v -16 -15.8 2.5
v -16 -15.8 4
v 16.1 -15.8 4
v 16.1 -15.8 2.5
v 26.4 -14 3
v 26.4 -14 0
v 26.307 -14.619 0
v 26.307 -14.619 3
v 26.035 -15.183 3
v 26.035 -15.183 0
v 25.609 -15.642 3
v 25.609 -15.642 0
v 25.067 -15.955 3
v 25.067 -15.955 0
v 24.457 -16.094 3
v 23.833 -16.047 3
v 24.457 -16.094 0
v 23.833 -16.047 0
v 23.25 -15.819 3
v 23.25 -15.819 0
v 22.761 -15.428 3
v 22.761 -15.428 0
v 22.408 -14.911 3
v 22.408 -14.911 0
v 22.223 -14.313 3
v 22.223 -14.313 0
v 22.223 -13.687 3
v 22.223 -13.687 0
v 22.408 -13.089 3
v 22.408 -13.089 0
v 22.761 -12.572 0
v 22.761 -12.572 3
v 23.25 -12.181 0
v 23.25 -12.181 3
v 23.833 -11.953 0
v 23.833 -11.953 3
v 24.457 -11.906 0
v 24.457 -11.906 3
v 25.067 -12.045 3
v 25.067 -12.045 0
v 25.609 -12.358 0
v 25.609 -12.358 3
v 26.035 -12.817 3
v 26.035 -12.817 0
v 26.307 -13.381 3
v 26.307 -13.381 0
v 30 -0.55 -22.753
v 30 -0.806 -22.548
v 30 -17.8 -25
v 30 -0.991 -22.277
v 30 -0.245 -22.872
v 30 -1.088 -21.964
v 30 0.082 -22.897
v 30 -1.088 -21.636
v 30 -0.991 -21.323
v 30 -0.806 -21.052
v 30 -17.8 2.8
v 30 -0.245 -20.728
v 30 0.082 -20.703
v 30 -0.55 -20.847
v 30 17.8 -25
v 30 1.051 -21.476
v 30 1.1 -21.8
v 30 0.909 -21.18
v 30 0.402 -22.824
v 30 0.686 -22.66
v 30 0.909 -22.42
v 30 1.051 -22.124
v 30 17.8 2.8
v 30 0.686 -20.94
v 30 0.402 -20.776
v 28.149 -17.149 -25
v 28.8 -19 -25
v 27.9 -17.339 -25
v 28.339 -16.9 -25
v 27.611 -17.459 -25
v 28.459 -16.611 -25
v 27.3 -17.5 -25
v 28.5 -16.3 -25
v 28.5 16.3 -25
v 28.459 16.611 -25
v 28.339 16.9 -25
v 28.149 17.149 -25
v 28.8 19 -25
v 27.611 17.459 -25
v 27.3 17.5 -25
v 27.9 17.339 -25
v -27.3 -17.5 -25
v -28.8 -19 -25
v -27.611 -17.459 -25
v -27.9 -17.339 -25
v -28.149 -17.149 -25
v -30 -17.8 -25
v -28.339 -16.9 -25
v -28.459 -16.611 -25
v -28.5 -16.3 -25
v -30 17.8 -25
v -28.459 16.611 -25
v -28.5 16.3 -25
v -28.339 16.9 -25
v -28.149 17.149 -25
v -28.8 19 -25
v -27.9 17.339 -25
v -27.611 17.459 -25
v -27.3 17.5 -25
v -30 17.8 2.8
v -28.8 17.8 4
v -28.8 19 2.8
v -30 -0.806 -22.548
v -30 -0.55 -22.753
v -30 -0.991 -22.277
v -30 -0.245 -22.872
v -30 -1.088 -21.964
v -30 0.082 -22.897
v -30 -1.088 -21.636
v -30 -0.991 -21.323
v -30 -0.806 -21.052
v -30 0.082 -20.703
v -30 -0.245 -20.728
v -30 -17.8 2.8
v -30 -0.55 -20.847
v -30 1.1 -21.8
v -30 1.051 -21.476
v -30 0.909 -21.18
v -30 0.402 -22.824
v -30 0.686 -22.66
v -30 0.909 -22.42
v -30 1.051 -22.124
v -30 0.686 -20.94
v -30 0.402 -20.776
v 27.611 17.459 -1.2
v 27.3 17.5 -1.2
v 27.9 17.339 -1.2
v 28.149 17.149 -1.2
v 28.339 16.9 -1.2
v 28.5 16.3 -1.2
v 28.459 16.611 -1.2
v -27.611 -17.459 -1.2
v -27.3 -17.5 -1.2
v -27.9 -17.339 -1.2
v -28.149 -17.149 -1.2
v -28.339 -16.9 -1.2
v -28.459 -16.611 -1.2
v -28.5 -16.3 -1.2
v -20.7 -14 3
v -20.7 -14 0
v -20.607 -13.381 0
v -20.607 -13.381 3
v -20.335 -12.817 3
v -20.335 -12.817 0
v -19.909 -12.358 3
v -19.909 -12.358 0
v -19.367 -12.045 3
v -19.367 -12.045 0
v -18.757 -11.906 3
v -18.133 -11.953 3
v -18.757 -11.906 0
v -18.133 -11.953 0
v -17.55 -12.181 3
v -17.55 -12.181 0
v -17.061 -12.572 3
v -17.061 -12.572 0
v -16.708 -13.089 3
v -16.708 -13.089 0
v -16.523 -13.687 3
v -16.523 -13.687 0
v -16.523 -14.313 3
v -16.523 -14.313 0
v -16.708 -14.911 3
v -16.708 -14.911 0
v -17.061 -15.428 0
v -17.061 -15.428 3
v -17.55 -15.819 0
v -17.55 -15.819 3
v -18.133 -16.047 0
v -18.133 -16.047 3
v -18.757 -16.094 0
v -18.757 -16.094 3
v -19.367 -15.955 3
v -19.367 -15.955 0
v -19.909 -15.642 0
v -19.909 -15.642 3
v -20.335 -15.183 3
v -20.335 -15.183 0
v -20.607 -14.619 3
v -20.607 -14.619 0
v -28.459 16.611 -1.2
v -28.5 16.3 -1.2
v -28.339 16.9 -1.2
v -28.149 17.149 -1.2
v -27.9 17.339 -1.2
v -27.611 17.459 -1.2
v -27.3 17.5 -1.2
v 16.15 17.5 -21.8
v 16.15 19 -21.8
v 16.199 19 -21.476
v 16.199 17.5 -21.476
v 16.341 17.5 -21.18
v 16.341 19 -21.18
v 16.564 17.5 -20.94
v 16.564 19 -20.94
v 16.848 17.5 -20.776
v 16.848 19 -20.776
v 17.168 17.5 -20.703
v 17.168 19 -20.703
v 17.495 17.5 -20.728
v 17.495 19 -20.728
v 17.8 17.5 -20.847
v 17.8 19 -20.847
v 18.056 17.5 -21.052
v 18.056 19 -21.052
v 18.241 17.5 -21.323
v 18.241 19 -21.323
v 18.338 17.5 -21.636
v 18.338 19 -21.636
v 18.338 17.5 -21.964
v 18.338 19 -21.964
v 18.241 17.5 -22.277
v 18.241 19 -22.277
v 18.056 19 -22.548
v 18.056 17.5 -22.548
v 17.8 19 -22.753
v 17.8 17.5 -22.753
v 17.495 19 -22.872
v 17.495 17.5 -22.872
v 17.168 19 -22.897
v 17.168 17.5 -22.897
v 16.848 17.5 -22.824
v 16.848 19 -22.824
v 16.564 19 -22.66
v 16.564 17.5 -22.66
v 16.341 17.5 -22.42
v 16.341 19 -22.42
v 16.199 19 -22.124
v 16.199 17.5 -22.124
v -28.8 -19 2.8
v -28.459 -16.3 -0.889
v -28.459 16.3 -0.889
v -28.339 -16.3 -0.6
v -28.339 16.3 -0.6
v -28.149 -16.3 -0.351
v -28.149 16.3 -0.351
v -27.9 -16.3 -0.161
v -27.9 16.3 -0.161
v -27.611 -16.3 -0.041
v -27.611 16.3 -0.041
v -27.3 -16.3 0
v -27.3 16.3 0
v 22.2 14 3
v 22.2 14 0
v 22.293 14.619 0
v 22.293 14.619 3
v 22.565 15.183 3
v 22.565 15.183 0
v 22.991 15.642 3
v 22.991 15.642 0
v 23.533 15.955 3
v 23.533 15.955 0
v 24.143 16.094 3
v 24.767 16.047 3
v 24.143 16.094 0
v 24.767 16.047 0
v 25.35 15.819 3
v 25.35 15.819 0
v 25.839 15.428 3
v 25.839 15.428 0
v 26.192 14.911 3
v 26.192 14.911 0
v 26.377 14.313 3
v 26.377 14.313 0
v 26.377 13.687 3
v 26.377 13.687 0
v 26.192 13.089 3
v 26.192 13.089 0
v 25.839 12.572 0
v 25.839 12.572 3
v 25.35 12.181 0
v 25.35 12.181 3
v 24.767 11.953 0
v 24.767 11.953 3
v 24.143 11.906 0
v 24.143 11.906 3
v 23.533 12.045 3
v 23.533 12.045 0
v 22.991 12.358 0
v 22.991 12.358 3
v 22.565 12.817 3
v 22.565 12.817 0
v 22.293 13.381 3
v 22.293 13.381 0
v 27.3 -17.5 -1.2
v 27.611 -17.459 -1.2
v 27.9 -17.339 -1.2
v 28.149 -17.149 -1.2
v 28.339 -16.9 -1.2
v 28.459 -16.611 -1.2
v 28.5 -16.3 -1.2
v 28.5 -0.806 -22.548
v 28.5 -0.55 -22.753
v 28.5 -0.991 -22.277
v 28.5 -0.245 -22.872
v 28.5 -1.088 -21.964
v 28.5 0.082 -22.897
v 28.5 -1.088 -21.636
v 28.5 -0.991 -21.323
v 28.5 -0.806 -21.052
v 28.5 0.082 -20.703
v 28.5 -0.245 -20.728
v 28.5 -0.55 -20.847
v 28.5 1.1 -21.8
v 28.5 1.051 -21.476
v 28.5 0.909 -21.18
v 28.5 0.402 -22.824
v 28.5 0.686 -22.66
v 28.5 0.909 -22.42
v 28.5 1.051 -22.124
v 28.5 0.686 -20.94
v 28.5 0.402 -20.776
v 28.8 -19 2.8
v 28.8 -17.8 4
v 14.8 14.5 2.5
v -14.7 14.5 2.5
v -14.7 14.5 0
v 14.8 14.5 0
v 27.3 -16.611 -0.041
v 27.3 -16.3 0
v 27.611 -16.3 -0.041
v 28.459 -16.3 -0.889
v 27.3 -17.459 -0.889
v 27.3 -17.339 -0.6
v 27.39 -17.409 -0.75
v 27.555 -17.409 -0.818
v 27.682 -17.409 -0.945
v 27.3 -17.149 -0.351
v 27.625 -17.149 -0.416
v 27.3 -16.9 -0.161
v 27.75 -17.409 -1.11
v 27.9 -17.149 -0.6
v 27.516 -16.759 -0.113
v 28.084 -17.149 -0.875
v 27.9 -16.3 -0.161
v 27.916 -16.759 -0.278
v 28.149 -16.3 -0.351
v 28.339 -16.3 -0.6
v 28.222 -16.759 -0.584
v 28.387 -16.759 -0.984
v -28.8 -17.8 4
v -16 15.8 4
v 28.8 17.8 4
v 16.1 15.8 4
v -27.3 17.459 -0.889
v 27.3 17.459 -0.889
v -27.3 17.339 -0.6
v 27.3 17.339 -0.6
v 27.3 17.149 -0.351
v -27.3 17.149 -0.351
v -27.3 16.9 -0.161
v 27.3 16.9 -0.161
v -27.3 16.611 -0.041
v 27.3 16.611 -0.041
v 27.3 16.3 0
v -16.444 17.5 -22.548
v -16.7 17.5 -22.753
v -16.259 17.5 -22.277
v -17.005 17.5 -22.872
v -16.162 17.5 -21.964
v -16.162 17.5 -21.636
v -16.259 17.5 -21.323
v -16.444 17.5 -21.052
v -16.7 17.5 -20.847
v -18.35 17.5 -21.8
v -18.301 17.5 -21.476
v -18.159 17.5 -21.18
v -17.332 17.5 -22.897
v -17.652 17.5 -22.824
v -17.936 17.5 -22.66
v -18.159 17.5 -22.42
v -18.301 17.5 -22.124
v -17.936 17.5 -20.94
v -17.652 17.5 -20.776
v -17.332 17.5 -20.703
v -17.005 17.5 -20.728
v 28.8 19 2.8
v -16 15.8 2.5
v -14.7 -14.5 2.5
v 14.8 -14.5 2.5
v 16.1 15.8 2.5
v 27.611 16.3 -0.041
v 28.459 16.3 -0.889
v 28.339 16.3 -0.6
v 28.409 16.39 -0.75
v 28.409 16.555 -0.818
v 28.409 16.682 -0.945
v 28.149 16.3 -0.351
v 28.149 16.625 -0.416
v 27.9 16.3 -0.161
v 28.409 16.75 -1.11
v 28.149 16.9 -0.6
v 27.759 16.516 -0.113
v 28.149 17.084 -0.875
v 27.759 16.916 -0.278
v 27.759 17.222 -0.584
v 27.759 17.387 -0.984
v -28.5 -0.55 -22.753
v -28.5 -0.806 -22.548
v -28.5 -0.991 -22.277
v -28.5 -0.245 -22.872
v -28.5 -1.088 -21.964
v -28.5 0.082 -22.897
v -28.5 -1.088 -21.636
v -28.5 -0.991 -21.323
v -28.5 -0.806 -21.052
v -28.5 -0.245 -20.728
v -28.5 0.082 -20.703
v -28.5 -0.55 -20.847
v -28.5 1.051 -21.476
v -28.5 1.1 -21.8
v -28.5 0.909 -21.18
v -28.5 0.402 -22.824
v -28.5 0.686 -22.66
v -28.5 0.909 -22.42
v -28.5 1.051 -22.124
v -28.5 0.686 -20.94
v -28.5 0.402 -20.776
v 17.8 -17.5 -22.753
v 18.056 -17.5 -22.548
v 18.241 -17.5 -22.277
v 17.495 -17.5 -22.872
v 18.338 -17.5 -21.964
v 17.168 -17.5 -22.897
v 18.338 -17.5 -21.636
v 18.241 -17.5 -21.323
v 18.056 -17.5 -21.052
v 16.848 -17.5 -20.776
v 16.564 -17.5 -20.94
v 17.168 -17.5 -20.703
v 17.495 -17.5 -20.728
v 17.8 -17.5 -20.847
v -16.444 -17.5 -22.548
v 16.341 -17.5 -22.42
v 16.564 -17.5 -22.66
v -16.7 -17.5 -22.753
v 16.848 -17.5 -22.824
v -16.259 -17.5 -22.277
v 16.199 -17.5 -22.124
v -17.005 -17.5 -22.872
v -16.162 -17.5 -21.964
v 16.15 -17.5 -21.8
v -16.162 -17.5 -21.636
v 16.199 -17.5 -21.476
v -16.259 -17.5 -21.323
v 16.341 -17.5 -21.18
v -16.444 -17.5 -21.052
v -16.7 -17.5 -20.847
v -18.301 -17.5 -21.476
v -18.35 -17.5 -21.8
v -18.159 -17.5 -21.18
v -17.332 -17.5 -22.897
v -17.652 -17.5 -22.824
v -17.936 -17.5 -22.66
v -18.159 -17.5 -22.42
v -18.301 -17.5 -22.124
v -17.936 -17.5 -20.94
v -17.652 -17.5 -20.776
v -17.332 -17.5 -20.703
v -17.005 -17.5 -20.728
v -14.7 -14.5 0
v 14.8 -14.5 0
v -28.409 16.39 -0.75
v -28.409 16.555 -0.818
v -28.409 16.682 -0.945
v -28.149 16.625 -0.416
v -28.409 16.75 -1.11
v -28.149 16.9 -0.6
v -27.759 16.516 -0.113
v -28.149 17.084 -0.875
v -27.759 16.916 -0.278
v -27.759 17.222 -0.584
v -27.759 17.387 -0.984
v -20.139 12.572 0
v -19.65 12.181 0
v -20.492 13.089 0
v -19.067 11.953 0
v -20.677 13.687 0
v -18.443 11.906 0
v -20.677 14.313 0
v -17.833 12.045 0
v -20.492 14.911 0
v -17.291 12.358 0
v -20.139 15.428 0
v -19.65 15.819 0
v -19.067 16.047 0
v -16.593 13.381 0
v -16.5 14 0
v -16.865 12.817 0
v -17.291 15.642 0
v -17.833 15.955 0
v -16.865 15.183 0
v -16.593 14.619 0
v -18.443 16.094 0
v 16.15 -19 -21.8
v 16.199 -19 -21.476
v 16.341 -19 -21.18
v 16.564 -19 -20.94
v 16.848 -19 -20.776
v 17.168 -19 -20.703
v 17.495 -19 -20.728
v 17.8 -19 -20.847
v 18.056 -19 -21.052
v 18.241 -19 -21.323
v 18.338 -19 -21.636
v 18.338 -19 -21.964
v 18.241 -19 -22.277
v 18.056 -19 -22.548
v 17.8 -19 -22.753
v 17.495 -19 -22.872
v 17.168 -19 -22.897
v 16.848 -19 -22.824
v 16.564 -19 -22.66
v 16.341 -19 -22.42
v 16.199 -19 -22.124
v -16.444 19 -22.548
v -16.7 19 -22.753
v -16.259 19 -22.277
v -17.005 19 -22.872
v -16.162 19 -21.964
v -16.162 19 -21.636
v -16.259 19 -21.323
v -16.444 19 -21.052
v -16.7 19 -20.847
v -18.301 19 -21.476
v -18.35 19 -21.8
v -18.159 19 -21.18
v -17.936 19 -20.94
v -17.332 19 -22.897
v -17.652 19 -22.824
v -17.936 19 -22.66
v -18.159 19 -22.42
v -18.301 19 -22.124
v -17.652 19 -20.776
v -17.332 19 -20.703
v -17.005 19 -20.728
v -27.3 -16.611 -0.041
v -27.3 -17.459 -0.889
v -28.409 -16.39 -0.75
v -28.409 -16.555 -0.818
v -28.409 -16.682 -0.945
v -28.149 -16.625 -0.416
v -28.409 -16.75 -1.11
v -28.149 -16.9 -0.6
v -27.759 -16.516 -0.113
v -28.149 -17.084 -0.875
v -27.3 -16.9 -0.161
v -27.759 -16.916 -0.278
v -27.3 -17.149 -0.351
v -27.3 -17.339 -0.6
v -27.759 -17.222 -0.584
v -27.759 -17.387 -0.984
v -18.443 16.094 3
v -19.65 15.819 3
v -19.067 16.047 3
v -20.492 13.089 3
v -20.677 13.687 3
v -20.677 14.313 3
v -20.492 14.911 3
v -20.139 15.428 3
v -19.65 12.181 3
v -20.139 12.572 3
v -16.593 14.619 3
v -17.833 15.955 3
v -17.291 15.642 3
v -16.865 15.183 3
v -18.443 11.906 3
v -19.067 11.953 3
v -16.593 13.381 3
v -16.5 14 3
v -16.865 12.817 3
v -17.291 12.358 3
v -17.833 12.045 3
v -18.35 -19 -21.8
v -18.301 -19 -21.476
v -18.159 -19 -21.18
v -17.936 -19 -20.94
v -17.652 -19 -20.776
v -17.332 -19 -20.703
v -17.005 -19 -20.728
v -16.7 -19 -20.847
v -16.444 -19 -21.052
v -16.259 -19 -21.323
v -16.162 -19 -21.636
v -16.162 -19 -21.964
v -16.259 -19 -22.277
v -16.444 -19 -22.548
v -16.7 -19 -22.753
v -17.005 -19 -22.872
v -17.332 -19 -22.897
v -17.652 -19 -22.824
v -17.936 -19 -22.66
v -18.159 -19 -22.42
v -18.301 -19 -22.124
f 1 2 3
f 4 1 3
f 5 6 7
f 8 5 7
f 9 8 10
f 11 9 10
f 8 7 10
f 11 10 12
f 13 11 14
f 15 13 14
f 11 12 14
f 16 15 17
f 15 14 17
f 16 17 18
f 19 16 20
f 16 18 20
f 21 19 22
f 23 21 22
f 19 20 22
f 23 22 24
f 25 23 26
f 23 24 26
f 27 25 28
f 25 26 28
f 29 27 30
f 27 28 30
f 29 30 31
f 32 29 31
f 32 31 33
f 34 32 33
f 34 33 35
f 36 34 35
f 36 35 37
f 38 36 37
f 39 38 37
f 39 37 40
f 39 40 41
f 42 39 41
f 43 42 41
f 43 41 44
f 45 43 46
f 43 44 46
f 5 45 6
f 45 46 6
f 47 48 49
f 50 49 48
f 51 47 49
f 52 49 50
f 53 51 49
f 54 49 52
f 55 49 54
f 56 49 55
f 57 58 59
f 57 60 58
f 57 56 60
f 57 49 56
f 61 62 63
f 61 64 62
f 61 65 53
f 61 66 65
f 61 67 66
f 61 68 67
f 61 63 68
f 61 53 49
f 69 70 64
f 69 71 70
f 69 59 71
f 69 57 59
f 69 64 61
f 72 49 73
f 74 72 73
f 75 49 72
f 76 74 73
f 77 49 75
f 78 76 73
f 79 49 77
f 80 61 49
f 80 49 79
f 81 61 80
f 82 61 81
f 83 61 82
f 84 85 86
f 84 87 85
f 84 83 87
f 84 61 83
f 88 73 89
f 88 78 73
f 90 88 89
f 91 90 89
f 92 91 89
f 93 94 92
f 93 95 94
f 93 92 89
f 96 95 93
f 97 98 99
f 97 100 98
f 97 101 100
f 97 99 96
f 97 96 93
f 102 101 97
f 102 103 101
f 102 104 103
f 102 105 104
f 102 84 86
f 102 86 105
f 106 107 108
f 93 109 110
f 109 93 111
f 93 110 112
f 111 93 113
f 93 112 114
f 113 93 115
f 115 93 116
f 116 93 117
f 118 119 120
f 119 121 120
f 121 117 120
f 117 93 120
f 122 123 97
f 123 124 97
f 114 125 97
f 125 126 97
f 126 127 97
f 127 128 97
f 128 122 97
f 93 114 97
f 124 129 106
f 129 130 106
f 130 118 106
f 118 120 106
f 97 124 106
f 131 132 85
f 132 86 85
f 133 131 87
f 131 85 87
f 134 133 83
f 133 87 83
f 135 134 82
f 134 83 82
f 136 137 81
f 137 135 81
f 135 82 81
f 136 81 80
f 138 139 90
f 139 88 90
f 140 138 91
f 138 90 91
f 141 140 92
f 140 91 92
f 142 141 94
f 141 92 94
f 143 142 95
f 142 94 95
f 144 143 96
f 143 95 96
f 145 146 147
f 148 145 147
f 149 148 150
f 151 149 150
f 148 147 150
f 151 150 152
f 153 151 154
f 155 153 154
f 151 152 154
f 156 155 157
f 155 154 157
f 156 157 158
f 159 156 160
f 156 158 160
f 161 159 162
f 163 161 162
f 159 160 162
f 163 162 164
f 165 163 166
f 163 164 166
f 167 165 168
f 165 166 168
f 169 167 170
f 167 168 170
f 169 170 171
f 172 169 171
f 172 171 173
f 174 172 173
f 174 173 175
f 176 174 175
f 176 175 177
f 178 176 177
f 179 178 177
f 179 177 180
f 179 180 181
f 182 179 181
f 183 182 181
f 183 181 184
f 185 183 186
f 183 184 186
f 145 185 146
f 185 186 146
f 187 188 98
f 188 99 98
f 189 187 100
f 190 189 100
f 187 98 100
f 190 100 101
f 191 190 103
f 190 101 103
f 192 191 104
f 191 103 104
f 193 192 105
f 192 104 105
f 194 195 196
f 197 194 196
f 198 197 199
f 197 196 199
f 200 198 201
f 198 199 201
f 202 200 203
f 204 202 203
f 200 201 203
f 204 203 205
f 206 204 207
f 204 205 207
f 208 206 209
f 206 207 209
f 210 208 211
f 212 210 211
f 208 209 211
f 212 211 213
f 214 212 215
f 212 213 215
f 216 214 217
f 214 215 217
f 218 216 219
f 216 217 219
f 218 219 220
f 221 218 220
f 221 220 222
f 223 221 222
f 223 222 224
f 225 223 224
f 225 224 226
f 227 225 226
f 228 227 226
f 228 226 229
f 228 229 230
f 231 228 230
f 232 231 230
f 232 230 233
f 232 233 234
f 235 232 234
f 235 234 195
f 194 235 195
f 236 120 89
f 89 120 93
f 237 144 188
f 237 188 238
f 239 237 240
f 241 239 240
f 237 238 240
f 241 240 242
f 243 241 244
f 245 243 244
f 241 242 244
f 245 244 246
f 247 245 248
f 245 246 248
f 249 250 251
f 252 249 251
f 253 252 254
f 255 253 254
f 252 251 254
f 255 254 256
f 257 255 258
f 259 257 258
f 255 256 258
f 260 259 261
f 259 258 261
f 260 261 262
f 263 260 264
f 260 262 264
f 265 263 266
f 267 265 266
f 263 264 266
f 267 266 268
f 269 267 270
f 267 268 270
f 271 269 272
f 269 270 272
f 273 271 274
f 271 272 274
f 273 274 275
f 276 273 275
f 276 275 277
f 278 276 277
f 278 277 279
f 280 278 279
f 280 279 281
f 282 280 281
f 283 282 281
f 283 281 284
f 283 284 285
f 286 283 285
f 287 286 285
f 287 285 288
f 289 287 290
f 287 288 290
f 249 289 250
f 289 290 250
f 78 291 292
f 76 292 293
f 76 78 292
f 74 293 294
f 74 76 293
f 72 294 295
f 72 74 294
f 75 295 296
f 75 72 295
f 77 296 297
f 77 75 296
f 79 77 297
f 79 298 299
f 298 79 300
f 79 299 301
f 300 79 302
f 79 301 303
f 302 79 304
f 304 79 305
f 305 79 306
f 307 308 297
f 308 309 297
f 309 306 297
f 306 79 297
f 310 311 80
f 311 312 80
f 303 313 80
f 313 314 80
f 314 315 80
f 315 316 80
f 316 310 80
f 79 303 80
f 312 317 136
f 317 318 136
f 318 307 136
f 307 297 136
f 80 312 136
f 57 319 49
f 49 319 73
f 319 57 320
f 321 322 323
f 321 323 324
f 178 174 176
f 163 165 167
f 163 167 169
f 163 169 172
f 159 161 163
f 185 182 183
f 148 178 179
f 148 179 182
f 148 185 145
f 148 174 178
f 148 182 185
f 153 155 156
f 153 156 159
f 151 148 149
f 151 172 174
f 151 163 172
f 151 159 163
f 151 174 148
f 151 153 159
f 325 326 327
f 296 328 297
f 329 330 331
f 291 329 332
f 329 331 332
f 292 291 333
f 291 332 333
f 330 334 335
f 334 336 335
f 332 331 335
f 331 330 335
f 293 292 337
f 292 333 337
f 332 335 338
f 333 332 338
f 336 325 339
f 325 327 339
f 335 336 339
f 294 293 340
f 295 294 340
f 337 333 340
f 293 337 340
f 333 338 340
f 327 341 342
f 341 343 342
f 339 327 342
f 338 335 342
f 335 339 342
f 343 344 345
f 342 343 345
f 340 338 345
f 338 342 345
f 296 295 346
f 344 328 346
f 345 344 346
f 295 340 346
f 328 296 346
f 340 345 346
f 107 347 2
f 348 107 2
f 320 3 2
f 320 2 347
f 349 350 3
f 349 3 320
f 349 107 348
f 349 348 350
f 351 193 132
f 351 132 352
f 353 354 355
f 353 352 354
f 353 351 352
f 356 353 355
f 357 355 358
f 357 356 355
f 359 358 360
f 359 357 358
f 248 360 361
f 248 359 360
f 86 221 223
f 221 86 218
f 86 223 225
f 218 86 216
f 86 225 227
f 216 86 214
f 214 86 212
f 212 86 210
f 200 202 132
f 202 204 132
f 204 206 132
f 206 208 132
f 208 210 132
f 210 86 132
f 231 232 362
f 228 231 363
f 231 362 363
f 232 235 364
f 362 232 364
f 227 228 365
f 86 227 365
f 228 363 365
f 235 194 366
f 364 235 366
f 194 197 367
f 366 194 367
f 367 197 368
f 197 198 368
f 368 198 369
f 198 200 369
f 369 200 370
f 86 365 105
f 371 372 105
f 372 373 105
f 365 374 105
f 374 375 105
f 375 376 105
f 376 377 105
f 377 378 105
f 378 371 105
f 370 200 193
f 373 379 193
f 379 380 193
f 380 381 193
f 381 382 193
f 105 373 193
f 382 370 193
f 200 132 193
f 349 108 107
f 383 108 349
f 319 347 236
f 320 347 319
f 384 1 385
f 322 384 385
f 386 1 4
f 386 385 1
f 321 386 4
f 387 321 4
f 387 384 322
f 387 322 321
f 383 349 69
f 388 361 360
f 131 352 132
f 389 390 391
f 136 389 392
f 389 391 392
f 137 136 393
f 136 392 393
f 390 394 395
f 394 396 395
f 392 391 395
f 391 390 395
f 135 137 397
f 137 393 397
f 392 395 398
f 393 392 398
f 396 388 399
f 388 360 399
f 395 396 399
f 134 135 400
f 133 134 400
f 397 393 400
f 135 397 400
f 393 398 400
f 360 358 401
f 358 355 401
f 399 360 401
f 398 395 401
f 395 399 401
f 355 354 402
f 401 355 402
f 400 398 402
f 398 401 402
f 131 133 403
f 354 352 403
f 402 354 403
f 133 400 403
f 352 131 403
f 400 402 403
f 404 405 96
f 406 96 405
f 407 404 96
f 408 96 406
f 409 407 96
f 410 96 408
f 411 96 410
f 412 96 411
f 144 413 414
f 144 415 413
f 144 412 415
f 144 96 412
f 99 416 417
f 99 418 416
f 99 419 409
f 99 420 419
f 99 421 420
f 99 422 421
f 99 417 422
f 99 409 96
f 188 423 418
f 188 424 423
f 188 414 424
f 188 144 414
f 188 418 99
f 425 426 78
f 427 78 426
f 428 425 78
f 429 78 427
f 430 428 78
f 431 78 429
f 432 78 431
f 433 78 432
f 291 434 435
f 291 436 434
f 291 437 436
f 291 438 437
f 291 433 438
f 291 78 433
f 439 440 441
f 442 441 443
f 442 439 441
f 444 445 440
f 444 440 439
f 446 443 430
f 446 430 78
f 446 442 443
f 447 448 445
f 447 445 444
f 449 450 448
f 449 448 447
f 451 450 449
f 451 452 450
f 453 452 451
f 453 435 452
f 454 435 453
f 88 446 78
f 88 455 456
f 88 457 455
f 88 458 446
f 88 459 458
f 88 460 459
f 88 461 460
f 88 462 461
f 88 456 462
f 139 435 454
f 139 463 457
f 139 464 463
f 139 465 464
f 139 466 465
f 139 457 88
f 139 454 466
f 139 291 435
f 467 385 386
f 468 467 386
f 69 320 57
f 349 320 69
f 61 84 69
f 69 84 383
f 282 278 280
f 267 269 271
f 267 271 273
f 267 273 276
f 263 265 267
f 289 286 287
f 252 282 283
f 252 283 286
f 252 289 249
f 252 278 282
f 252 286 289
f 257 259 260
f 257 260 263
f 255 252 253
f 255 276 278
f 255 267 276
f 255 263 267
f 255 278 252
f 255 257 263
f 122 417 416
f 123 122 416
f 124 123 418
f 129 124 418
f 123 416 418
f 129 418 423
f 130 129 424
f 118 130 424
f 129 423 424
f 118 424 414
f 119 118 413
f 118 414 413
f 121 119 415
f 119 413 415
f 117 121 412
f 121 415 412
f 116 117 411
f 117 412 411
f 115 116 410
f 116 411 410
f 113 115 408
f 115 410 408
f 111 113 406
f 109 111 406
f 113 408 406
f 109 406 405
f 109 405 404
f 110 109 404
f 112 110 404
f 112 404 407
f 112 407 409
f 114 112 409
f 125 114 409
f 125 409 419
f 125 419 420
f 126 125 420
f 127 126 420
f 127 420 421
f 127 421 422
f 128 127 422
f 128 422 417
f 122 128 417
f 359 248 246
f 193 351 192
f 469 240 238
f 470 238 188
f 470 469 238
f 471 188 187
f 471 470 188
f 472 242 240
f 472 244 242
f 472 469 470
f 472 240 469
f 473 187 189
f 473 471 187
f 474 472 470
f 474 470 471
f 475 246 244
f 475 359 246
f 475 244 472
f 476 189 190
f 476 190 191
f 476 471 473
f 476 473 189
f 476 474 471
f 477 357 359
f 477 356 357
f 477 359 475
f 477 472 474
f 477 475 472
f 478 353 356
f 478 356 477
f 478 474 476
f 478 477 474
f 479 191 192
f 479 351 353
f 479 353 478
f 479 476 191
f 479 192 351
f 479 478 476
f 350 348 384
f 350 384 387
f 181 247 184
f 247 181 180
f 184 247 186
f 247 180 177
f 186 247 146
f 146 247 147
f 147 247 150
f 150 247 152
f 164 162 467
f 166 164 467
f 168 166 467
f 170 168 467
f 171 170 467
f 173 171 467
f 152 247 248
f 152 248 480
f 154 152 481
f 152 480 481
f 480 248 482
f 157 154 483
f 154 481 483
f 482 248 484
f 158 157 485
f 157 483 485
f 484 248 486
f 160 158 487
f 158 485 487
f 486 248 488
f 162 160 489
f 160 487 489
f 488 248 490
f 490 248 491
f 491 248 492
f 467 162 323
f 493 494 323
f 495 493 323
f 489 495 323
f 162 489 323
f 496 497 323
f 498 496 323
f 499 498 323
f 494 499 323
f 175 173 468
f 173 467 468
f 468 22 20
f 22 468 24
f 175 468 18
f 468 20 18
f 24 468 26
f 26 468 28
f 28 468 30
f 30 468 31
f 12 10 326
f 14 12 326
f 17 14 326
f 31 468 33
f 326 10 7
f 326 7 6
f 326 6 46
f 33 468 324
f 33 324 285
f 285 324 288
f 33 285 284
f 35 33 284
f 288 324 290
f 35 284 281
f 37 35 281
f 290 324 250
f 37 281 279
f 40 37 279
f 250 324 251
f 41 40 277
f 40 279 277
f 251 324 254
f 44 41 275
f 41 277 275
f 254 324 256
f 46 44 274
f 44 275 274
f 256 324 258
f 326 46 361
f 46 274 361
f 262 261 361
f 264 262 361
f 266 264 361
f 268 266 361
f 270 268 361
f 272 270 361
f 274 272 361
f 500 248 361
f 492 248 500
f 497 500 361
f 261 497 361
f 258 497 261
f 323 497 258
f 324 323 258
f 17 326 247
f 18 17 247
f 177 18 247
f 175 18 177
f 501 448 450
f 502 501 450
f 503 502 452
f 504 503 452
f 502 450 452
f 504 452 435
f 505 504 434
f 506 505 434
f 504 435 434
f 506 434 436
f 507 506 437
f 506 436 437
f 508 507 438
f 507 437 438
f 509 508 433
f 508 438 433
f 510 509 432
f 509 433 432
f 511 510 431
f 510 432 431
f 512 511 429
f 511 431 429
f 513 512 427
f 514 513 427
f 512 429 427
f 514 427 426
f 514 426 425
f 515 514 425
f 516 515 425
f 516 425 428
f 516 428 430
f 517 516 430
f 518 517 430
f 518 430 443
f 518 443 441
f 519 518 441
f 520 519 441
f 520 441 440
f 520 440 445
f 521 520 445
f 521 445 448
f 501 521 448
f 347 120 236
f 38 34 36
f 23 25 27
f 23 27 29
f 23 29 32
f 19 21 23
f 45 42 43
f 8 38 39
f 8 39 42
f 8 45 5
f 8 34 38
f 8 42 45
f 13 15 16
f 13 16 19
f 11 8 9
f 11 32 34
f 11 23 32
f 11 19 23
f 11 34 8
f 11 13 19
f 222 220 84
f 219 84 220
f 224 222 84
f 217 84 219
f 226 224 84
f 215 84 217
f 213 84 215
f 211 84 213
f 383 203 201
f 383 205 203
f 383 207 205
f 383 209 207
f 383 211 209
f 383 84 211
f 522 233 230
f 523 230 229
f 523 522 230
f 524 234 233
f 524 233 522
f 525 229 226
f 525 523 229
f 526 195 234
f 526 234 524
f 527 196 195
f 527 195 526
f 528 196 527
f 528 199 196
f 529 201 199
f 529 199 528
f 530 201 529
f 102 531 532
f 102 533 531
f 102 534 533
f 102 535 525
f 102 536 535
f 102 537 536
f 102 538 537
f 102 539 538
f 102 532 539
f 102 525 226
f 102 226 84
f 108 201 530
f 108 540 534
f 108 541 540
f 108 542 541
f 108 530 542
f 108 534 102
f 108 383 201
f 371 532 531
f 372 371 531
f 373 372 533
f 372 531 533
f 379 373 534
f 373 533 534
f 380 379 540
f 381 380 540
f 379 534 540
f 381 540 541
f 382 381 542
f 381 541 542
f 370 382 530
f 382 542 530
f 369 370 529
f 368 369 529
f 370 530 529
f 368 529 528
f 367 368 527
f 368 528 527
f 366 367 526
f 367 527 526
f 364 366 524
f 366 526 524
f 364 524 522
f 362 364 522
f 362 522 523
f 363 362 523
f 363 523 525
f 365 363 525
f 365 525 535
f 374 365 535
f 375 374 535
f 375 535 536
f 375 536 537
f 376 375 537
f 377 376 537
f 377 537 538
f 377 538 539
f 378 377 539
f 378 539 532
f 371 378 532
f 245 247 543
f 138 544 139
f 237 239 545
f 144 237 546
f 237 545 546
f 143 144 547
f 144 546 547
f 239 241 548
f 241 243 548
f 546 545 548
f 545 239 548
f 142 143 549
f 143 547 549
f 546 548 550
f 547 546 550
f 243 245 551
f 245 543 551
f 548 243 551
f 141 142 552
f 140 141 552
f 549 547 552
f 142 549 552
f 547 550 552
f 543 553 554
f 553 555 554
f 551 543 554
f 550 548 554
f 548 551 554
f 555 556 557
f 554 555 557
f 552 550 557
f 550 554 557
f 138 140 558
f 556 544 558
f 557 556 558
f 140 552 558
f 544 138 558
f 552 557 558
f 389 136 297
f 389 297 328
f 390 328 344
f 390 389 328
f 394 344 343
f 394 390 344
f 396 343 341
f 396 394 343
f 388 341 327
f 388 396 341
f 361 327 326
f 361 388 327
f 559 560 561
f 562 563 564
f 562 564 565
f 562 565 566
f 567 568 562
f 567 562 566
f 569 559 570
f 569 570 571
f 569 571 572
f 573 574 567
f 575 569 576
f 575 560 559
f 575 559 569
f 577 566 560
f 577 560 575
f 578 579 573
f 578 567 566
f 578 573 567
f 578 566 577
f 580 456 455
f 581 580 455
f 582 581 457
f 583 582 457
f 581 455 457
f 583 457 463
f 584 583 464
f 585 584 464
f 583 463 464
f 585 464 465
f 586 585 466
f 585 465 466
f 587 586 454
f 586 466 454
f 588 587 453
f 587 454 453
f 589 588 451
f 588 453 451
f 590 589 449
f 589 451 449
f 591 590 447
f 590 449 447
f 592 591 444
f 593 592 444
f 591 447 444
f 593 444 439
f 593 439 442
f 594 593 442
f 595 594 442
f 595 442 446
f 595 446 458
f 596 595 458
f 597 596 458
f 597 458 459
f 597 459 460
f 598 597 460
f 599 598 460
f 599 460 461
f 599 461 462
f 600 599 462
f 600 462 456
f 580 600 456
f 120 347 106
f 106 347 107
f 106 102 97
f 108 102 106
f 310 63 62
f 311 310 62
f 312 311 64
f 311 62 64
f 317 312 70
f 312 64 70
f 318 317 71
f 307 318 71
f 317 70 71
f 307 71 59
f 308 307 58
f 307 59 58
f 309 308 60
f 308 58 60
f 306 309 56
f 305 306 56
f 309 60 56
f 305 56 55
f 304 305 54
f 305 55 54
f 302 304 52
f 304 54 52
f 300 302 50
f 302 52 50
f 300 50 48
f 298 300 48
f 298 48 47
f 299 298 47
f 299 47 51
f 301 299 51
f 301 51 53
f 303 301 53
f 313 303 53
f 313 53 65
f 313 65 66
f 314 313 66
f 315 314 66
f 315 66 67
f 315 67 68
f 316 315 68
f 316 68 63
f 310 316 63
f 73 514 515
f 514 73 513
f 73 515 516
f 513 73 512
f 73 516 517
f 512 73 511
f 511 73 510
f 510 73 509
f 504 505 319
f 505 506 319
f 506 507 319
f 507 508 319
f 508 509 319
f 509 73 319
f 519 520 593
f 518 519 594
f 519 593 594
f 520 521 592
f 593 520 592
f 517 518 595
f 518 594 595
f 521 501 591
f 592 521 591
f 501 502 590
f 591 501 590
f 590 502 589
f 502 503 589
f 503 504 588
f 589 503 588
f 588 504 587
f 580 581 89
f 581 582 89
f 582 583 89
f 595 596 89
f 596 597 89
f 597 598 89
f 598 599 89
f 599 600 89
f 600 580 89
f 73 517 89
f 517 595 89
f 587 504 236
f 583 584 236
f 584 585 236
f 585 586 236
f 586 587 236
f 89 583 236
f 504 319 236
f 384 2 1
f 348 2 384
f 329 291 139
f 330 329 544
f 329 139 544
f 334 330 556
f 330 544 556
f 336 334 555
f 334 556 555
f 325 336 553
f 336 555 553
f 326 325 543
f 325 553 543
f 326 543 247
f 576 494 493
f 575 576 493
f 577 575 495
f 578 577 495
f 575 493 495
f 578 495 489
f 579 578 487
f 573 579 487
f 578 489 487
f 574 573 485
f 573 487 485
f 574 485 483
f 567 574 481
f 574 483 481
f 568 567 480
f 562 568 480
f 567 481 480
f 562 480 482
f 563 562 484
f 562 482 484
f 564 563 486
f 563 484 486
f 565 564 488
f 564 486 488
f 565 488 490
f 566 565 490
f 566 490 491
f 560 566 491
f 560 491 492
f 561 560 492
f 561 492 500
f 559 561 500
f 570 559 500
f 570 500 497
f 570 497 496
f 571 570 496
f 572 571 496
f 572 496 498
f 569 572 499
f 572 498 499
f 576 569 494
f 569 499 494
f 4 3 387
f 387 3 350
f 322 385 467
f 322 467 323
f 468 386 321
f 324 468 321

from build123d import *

# Parameters (mm, degrees)
ESQUISSE1_W                     = 60
ESQUISSE1_H                     = 38
BASE_DEPTH                      = 4
ESQUISSE2_W                     = 29.5
ESQUISSE2_H                     = 29
SCREEN_DEPTH                    = 4
ESQUISSE5_R                     = 2.1
INSERTS_M3_DEPTH                = 3
ESQUISSE6_W                     = 60
ESQUISSE6_H                     = 38
ESQUISSE6_W_2                   = 57
ESQUISSE6_H_2                   = 35
WALLS_DEPTH                     = 25
CHANFREIN_EXT_SIZE              = 1.2
FILLET_INT_R                    = 1.2
ESQUISSE7_R                     = 1.1
PASSAGE_VIS_HORIZONTAL_DEPTH    = 68.720011813
ESQUISSE9_R                     = 1.1
PASSAGE_VIS_VERTICAL_DEPTH      = 55.488530903
ESQUISSE11_W                    = 32.1
ESQUISSE11_H                    = 31.6
EMPLACEMENT_VERRE_32_5_32_DEPTH = 1.5


with BuildPart() as part:
    # Esquisse1 → BASE (new body)
    with BuildSketch(Plane.XY):
        Rectangle(ESQUISSE1_W, ESQUISSE1_H)
    extrude(amount=BASE_DEPTH)

    # Esquisse2 → Screen (cut)
    with BuildSketch(Plane.XY.offset(4)):
        with Locations((0.05, 0)):
            Rectangle(ESQUISSE2_W, ESQUISSE2_H)
    extrude(amount=-SCREEN_DEPTH, mode=Mode.SUBTRACT)

    # Esquisse5 → Inserts_M3 (cut)
    with BuildSketch(Plane(origin=(0, 0, 0), x_dir=(-1, 0, 0), z_dir=(0, 0, -1))):
        with Locations((-24.3, 14)):
            Circle(ESQUISSE5_R)
        with Locations(Location((-24.3, -14, 0), (0, 0, 180))):
            Circle(ESQUISSE5_R)
        with Locations((18.6, -14)):
            Circle(ESQUISSE5_R)
        with Locations(Location((18.6, 14, 0), (0, 0, 180))):
            Circle(ESQUISSE5_R)
    extrude(amount=-INSERTS_M3_DEPTH, mode=Mode.SUBTRACT)

    # Esquisse6 → Walls (add)
    with BuildSketch(Plane(origin=(0, 0, 0), x_dir=(-1, 0, 0), z_dir=(0, 0, -1))):
        Rectangle(ESQUISSE6_W, ESQUISSE6_H)
        Rectangle(ESQUISSE6_W_2, ESQUISSE6_H_2, mode=Mode.SUBTRACT)
    extrude(amount=WALLS_DEPTH)

    # Chanfrein_EXT
    chanfrein_ext_edges = [part.edges().sort_by_distance(p)[0] for p in [
        (30, 0, 4),
        (0, 19, 4),
        (-30, 0, 4),
        (-30, 19, -10.5),
        (30, 19, -10.5),
        (30, -19, -10.5),
        (-30, -19, -10.5),
        (0, -19, 4),
    ]]
    chamfer(chanfrein_ext_edges, length=CHANFREIN_EXT_SIZE)

    # Fillet_INT
    fillet_int_edges = [part.edges().sort_by_distance(p)[0] for p in [
        (0, 17.5, 0),
        (28.5, 0, 0),
        (0, -17.5, 0),
        (-28.5, 0, 0),
        (28.5, 17.5, -12.5),
        (28.5, -17.5, -12.5),
        (-28.5, -17.5, -12.5),
        (-28.5, 17.5, -12.5),
    ]]
    fillet(fillet_int_edges, radius=FILLET_INT_R)

    # Esquisse7 → Passage_Vis_Horizontal (cut, through all)
    with BuildSketch(Plane(origin=(30, 0, 0), x_dir=(0, 0, -1), z_dir=(1, 0, 0))):
        with Locations(Location((21.8, 0, 0), (0, 0, 90))):
            Circle(ESQUISSE7_R)
    extrude(amount=-PASSAGE_VIS_HORIZONTAL_DEPTH, mode=Mode.SUBTRACT)

    # Esquisse9 → Passage_Vis_Vertical (cut, through all)
    with BuildSketch(Plane(origin=(0, 19, 0), x_dir=(1, 0, 0), z_dir=(0, 1, 0))):
        with Locations(Location((-17.25, 21.8, 0), (0, 0, 180))):
            Circle(ESQUISSE9_R)
        with Locations(Location((17.25, 21.8, 0), (0, 0, 180))):
            Circle(ESQUISSE9_R)
    extrude(amount=-PASSAGE_VIS_VERTICAL_DEPTH, mode=Mode.SUBTRACT)

    # Esquisse11 → Emplacement Verre 32.5*32 (cut)
    with BuildSketch(Plane.XY.offset(4)):
        with Locations((0.05, 0)):
            Rectangle(ESQUISSE11_W, ESQUISSE11_H)
    extrude(amount=-EMPLACEMENT_VERRE_32_5_32_DEPTH, mode=Mode.SUBTRACT)


solid = part.part
